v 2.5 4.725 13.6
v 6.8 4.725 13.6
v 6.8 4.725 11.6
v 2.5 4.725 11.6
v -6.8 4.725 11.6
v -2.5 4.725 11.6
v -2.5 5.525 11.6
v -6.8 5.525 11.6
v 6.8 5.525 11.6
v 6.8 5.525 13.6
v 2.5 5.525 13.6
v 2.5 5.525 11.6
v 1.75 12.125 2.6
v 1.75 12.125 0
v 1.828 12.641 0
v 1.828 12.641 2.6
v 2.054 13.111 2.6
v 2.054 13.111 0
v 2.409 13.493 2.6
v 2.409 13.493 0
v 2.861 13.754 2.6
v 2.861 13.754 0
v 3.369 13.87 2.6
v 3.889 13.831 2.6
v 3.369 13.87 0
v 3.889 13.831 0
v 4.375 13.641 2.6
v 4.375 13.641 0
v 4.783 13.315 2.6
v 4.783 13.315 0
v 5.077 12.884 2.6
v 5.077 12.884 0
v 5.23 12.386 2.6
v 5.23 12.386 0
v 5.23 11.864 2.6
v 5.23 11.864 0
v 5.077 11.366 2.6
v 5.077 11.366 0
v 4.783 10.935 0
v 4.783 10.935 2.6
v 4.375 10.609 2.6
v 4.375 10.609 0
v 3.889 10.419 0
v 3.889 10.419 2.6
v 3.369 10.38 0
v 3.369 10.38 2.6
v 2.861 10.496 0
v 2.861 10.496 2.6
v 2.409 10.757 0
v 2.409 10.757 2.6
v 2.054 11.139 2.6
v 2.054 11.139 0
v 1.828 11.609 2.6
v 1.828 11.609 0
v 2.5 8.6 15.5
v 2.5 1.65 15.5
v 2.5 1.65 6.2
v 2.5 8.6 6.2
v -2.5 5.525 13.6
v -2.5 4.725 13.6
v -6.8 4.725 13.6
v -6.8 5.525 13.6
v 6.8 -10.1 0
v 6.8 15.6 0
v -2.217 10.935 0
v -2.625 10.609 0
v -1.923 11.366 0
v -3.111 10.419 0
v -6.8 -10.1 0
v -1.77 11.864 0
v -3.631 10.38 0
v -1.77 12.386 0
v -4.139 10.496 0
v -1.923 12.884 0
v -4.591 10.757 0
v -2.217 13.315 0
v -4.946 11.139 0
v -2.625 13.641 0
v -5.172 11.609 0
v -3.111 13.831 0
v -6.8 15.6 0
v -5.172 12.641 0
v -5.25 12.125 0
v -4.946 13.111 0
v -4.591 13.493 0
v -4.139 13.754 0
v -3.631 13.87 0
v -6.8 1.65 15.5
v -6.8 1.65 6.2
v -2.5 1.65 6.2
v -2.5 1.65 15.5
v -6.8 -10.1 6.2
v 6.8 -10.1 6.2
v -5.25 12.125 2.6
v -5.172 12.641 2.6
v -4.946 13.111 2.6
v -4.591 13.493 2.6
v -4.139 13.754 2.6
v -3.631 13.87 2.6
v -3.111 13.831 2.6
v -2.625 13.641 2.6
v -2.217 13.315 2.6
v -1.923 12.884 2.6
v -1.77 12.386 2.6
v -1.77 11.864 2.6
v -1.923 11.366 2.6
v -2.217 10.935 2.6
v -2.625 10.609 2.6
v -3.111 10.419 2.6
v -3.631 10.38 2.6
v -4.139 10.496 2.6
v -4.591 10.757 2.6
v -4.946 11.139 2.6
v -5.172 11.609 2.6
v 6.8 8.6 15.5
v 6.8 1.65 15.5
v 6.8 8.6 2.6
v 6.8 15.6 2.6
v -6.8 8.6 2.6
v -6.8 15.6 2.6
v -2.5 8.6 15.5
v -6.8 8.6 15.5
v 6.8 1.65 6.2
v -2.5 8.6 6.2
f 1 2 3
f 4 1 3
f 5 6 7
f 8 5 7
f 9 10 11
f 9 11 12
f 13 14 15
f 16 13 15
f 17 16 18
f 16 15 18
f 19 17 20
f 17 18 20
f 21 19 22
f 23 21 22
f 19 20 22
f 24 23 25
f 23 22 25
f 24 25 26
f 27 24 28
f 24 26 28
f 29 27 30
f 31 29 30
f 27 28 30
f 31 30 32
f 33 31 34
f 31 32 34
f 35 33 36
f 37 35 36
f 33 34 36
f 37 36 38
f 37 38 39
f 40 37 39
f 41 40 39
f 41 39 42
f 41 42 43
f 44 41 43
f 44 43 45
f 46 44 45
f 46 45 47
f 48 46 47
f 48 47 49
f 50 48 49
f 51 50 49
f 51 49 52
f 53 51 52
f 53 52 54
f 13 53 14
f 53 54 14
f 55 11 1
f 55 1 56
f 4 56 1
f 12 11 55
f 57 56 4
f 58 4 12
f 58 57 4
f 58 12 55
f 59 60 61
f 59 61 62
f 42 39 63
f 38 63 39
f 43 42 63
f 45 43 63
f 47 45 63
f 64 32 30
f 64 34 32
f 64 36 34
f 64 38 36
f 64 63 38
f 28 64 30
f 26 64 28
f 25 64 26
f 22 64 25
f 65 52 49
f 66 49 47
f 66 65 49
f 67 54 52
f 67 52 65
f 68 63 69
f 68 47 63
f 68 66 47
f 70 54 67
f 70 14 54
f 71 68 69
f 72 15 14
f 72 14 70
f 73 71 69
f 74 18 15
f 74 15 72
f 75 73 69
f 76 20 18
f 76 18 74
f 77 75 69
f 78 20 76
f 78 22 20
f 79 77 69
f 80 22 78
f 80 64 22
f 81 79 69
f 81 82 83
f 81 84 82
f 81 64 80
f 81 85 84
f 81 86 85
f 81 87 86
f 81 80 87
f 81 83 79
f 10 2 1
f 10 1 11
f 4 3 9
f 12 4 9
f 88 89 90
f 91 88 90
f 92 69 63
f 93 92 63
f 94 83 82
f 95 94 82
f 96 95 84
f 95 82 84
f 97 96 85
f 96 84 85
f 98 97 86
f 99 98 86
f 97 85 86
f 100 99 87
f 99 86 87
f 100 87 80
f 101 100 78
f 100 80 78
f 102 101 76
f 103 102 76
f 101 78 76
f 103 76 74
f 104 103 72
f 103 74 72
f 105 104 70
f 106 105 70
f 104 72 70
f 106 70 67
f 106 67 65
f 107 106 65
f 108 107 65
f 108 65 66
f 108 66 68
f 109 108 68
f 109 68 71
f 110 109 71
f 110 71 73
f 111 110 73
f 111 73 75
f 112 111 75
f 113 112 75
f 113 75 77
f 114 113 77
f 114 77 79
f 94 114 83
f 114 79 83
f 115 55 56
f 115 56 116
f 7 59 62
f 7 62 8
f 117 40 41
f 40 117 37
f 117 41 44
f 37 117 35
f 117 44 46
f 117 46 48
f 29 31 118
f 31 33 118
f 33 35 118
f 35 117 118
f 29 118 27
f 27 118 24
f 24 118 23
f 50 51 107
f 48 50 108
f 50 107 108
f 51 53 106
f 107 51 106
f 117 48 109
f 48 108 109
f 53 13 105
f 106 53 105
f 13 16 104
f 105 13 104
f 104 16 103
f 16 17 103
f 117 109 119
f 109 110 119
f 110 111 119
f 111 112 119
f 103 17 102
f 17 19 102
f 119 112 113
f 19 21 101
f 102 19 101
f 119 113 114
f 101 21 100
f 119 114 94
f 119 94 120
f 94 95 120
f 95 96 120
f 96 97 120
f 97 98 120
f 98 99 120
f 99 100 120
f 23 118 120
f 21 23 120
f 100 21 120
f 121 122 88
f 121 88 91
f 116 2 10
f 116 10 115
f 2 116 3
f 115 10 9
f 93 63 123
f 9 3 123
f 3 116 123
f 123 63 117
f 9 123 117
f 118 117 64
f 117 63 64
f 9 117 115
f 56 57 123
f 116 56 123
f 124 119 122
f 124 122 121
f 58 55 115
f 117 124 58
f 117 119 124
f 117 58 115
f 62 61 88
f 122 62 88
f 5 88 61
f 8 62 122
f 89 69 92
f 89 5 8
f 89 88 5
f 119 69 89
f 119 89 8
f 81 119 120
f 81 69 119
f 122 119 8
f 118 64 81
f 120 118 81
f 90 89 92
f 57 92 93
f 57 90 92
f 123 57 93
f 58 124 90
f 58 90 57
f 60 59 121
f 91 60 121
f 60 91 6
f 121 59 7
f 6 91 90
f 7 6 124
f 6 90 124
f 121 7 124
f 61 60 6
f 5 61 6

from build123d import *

# Parameters (mm, degrees)
SKETCH_1_W          = 13.6
SKETCH_1_H          = 18.7
EXTRUDE_1_DEPTH     = 6.2
SKETCH_2_W          = 4.3
SKETCH_2_H          = 6.95
EXTRUDE_2_DEPTH     = 9.3
SKETCH_3_W          = 13.6
SKETCH_3_H          = 7
SKETCH_3_R          = 1.75
EXTRUDE_3_DEPTH     = 2.6
SKETCH_4_W          = 2
SKETCH_4_H          = 0.8
CUT_EXTRUDE_1_DEPTH = 26.856720596


with BuildPart() as part:
    # 草图1 → 凸台-拉伸1 (new body)
    with BuildSketch(Plane.XY):
        with Locations((0, -0.75)):
            Rectangle(SKETCH_1_W, SKETCH_1_H)
    extrude(amount=EXTRUDE_1_DEPTH)

    # 草图2 → 凸台-拉伸2 (add)
    with BuildSketch(Plane.XY.offset(6.2)):
        with Locations((4.65, 5.125)):
            Rectangle(SKETCH_2_W, SKETCH_2_H)
        with Locations((-4.65, 5.125)):
            Rectangle(SKETCH_2_W, SKETCH_2_H)
    extrude(amount=EXTRUDE_2_DEPTH)

    # 草图3 → 凸台-拉伸3 (add)
    with BuildSketch(Plane(origin=(0, 0, 0), x_dir=(-1, 0, 0), z_dir=(0, 0, -1))):
        with Locations((0, 12.1)):
            Rectangle(SKETCH_3_W, SKETCH_3_H)
        with Locations((-3.5, 12.125)):
            Circle(SKETCH_3_R, mode=Mode.SUBTRACT)
        with Locations((3.5, 12.125)):
            Circle(SKETCH_3_R, mode=Mode.SUBTRACT)
    extrude(amount=-EXTRUDE_3_DEPTH)

    # 草图4 → 切除-拉伸1 (cut, through all)
    with BuildSketch(Plane(origin=(6.8, 0, 0), x_dir=(0, 0, -1), z_dir=(1, 0, 0))):
        with Locations((-12.6, 5.125)):
            Rectangle(SKETCH_4_W, SKETCH_4_H)
    extrude(amount=-CUT_EXTRUDE_1_DEPTH, mode=Mode.SUBTRACT)


solid = part.part
